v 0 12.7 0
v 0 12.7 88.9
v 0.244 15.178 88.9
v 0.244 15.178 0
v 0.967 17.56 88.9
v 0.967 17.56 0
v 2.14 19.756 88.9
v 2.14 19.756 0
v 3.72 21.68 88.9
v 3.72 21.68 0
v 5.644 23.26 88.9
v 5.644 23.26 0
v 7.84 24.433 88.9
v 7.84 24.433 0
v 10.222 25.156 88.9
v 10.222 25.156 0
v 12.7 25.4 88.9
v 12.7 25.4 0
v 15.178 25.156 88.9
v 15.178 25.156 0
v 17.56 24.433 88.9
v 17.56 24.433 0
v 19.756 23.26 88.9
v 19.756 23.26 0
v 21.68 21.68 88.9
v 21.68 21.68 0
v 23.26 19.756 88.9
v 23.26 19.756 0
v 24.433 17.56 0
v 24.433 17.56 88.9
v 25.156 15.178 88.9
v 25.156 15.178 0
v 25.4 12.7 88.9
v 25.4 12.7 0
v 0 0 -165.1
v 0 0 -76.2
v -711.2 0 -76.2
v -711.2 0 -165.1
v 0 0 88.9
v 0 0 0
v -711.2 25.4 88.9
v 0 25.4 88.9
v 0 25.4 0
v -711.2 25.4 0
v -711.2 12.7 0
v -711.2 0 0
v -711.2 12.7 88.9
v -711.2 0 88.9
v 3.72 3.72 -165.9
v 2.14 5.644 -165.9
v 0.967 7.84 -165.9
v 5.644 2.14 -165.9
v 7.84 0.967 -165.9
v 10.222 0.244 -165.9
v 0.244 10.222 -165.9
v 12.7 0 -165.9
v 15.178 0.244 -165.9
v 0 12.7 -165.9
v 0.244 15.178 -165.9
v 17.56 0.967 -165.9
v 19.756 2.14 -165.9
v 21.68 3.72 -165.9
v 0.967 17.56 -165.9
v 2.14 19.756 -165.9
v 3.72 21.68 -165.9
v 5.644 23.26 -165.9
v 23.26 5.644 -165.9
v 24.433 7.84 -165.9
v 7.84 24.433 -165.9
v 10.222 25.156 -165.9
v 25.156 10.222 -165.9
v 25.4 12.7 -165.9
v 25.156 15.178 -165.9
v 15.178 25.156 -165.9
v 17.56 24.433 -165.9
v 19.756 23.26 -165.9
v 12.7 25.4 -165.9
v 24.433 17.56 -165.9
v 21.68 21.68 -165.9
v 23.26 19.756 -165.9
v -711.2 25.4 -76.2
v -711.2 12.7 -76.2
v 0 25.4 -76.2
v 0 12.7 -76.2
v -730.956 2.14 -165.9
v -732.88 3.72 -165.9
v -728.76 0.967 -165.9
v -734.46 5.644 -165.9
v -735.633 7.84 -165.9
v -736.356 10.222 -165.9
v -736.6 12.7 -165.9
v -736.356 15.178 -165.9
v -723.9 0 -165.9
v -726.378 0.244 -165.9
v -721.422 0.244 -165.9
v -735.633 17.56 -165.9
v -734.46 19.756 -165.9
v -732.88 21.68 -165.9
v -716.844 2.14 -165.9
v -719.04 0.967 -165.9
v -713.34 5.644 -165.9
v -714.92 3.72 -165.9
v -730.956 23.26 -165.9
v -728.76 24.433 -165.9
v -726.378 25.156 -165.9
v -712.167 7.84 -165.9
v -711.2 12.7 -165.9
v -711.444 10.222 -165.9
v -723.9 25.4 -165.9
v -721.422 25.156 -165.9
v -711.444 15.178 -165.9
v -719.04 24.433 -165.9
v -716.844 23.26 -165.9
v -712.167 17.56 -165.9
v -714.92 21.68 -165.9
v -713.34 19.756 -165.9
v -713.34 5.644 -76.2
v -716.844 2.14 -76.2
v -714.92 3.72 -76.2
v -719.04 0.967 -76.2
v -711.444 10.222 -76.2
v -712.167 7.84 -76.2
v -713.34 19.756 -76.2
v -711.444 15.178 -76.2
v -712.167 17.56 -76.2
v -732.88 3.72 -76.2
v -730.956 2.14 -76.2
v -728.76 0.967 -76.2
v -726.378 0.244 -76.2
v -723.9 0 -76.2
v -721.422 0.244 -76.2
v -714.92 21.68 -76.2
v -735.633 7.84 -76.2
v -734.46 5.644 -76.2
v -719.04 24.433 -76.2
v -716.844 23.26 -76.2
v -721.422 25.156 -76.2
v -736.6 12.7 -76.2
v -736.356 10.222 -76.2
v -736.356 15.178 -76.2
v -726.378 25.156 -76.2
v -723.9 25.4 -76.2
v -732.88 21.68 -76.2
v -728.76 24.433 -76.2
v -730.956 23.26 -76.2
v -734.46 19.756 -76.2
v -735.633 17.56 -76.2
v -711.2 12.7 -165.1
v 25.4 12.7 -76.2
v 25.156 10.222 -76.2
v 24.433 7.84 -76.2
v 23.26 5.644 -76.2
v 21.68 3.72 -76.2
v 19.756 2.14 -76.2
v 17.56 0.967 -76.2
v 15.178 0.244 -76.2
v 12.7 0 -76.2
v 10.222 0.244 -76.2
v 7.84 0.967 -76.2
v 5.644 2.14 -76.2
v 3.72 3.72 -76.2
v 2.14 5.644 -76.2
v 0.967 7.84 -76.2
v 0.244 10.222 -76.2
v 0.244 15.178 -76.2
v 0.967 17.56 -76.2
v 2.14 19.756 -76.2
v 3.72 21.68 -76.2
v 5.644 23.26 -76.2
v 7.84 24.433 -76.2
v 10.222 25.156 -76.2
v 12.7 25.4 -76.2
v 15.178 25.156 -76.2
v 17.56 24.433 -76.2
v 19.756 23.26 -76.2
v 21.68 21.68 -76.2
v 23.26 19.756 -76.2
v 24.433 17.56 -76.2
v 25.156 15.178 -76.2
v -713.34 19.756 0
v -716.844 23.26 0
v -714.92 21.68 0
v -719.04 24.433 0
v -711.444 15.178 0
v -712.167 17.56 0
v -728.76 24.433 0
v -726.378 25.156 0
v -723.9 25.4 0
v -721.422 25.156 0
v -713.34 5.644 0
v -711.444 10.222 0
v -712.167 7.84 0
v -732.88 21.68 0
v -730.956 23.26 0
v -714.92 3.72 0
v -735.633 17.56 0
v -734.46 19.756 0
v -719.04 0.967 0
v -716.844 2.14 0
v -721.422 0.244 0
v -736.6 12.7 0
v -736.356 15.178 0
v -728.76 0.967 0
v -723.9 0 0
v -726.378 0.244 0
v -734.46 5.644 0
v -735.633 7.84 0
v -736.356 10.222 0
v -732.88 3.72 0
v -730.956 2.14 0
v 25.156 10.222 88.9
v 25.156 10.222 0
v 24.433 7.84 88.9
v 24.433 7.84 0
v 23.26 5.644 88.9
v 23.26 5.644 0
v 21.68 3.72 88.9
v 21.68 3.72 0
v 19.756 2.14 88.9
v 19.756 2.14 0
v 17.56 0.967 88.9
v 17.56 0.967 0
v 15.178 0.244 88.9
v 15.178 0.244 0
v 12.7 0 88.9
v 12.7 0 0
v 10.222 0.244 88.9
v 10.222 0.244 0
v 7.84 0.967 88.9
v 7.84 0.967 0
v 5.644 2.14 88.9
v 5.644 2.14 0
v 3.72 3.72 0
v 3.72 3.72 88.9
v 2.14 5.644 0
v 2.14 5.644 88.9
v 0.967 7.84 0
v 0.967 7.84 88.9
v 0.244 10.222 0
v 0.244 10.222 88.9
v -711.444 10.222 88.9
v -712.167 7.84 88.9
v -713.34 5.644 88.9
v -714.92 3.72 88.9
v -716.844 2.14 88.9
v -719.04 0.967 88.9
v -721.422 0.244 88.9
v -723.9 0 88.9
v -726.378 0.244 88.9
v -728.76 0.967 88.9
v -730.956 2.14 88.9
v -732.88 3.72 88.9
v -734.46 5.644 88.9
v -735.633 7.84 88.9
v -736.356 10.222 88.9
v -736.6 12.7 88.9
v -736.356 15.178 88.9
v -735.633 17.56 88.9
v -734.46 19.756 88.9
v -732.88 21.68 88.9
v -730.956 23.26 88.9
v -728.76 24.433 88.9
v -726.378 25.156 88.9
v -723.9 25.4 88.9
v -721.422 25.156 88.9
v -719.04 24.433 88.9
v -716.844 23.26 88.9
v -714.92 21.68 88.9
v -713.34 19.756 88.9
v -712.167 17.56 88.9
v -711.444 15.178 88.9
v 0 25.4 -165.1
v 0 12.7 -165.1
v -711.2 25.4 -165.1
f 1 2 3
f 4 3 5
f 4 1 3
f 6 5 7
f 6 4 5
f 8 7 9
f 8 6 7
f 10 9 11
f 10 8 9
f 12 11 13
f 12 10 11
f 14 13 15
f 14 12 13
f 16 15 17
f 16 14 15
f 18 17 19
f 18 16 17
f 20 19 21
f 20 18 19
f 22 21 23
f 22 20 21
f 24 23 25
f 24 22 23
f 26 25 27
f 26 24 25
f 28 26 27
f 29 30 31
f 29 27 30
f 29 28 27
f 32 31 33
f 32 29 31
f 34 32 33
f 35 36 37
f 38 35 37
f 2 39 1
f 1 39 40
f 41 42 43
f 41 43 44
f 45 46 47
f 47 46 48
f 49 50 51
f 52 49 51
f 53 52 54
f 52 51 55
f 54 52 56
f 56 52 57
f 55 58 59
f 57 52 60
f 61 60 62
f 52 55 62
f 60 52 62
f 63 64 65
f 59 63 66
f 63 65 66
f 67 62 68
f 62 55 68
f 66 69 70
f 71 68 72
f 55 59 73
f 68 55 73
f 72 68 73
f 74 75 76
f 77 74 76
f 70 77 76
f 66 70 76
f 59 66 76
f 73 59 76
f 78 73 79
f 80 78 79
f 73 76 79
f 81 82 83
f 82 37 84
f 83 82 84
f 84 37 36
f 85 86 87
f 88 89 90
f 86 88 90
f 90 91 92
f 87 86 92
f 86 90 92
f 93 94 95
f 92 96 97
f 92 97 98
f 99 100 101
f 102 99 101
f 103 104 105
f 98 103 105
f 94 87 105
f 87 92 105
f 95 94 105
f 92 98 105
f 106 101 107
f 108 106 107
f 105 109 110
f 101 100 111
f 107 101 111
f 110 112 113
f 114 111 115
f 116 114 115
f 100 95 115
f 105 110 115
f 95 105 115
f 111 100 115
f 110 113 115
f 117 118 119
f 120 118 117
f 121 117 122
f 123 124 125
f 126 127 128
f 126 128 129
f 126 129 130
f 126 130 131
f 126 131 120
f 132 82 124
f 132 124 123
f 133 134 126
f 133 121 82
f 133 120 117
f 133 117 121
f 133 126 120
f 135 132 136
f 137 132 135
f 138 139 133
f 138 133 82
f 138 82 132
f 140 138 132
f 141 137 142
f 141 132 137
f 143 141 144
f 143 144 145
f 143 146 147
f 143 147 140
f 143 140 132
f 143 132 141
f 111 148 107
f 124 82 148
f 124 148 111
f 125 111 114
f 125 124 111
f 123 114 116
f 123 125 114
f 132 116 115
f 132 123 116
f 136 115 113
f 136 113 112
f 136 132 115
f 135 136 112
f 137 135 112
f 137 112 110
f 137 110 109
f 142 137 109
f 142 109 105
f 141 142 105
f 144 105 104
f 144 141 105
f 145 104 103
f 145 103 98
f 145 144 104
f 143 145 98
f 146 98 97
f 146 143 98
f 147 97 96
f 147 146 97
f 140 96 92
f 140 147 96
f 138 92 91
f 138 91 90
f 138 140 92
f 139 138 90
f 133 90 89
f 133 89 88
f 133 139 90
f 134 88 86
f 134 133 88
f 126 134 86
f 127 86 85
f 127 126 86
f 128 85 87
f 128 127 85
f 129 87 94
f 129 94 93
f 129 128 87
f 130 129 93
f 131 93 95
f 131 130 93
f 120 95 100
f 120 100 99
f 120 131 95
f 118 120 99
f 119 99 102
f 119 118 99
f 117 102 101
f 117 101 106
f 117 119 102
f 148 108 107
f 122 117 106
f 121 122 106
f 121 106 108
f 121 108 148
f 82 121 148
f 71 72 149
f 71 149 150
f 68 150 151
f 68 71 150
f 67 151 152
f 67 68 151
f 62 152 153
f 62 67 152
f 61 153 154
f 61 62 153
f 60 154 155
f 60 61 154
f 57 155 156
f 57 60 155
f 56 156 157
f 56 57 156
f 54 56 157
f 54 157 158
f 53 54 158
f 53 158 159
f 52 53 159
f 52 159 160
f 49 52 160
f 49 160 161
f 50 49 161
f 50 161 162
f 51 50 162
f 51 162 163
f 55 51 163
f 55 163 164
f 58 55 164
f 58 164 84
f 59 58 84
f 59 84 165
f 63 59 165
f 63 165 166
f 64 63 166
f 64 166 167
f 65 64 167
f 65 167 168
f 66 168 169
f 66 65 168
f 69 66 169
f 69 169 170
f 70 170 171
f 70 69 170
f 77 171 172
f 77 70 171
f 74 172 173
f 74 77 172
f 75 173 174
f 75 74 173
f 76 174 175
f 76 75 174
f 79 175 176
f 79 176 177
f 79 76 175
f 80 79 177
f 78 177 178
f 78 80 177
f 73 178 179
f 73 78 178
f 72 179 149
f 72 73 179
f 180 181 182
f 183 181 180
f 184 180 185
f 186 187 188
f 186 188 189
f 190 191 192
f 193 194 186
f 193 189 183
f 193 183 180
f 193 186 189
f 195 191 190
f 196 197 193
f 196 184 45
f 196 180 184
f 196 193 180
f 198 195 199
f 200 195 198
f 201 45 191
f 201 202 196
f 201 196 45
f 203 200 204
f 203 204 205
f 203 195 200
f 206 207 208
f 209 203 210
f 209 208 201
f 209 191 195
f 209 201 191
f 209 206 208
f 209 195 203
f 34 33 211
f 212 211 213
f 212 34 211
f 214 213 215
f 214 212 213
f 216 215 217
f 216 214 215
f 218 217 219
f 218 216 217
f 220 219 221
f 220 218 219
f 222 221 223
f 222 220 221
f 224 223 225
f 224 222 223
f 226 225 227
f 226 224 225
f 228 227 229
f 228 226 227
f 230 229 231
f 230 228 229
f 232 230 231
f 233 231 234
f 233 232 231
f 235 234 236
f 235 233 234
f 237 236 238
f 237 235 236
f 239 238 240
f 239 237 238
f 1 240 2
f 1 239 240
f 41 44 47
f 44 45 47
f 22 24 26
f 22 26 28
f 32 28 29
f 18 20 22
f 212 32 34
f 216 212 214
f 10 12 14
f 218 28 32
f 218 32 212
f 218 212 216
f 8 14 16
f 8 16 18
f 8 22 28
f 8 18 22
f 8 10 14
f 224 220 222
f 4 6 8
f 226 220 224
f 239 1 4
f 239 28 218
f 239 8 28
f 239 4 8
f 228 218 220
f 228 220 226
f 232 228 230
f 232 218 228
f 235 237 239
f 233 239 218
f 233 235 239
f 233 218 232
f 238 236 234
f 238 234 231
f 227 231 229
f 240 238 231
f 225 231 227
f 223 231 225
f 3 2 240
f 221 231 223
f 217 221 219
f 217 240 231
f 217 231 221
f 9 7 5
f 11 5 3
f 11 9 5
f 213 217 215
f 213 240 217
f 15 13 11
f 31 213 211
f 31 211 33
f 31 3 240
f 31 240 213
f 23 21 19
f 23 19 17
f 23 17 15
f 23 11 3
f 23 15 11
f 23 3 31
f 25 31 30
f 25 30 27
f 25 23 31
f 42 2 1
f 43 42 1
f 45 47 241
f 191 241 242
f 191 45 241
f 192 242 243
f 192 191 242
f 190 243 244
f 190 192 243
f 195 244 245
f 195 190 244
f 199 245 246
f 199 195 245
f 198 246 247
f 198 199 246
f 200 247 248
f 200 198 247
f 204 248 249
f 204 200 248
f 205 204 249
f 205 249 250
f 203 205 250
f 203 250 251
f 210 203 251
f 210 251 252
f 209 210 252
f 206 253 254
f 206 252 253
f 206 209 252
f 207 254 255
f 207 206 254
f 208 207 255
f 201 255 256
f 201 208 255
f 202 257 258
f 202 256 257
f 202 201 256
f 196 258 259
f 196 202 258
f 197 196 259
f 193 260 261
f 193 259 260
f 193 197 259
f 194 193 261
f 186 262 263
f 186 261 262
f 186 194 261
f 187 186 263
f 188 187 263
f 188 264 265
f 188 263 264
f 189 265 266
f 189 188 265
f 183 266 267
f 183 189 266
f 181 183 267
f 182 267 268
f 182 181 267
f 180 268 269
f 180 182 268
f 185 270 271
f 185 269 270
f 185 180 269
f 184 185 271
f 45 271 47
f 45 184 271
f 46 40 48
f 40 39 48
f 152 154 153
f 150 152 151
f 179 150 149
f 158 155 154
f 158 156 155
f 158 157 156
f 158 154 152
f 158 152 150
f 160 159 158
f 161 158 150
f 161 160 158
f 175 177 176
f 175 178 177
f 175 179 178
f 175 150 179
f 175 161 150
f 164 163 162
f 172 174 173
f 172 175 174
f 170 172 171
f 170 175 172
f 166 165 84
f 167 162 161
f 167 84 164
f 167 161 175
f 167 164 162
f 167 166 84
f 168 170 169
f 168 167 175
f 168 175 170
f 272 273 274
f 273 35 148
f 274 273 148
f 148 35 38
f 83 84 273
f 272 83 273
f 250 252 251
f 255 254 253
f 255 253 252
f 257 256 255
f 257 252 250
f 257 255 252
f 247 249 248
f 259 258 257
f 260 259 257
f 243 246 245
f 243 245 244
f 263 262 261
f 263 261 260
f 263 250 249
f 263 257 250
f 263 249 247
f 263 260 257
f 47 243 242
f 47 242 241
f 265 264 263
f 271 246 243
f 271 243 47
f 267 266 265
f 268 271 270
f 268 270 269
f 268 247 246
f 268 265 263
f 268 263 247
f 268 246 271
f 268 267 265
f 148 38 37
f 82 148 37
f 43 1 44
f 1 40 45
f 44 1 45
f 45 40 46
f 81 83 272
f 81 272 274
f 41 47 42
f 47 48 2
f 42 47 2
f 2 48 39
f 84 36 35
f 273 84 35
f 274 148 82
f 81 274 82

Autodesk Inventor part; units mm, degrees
ref_plane "YZ Plane" through (0, 0, 0) normal (1, 0, 0) x (0, 1, 0)
ref_plane "XZ Plane" through (0, 0, 0) normal (0, 1, 0) x (-1, 0, 0)
ref_plane "XY Plane" through (0, 0, 0) normal (0, 0, 1) x (1, 0, 0)
sketch "Sketch1" plane through (0, 0, 0) normal (0, 1, 0) x (-1, 0, 0)
  line L0 (0, 0) -> (711.2, 0)
  line L1 (711.2, 0) -> (711.2, 88.9)
  line L2 (711.2, 88.9) -> (0, 88.9)
  line L3 (0, 88.9) -> (0, 0)
  line L4 (711.2, -76.2) -> (0, -76.2)
  line L5 (0, -76.2) -> (0, -165.1)
  line L6 (0, -165.1) -> (711.2, -165.1)
  line L7 (711.2, -165.1) -> (711.2, -76.2)
  dimension "d0" = 88.9
  dimension "d1" = 711.2
  dimension "d2" = 88.9
  dimension "d3" = 711.2
  dimension "d4" = 76.2
extrude "Extrusion1" add sketch "Sketch1" along normal blind 25.4
sketch "Sketch2" plane through (-711.2, 0, -76.2) normal (0, 0, 1) x (1, 0, 0)
  line L0 (0, 25.4) -> (711.2, 25.4) projected
  circle A0 centre (723.9, 12.7) radius 12.7
  line L1 (711.2, 0) -> (0, 0) projected
  circle A1 centre (-12.7, 12.7) radius 12.7
extrude "Extrusion4" add sketch "Sketch2" along normal blind 165.1 and the other way blind 89.7001
sketch "Sketch3" plane through (0, 25.4, 88.9) normal (1, 0, 0) x (0, 0, -1)
  line L0 (88.9, -37.8138) -> (165.1, -37.8138)
  line L1 (165.1, -37.8138) -> (165.1, 10.1358)
  line L2 (165.1, 10.1358) -> (88.9, 10.1358)
  line L3 (88.9, 10.1358) -> (88.9, -37.8138)
  point P0 (88.9, -25.4)
extrude "Extrusion3" cut sketch "Sketch3" along normal blind 68.2625 and the other way blind 827.8876
properties part number "elev1" material "Aluminum 6061"
